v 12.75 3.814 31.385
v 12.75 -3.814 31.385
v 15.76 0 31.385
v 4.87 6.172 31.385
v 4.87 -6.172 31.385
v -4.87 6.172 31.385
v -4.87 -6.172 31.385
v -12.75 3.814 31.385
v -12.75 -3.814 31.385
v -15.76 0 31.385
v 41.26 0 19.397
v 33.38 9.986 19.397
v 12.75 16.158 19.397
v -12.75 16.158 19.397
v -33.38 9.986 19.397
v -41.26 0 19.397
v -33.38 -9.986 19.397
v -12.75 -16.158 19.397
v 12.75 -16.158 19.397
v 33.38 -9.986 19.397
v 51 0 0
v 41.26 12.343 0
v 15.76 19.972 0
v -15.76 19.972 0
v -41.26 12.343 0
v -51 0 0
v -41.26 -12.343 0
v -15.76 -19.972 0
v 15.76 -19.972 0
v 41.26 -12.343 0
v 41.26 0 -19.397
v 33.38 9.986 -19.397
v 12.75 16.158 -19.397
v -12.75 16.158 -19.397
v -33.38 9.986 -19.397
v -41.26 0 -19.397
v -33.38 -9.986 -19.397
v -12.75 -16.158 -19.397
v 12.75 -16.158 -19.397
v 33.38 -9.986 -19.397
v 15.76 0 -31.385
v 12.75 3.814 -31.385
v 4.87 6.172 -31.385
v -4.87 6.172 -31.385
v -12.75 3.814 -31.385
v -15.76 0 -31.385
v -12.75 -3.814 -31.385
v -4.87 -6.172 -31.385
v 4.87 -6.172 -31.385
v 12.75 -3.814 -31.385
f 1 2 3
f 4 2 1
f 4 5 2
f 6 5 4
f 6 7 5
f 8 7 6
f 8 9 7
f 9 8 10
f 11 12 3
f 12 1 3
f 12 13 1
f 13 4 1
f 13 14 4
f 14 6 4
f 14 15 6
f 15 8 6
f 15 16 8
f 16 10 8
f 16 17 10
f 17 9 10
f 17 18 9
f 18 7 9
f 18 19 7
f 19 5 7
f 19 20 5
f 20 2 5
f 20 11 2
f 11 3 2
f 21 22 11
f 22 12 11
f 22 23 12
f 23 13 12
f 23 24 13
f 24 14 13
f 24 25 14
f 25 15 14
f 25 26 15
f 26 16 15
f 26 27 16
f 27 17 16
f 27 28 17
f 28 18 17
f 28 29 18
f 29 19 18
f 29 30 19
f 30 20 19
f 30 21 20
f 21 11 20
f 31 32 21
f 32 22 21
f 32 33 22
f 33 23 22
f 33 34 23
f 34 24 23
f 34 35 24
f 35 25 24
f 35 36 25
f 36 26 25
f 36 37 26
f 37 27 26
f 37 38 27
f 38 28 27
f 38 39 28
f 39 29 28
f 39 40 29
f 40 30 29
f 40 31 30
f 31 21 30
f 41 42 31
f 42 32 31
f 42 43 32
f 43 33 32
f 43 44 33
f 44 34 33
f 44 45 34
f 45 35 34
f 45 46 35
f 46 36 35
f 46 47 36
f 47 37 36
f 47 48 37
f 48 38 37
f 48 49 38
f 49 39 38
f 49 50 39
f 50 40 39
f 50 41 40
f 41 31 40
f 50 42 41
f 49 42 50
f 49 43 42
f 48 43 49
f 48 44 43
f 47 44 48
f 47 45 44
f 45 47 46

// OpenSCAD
// Generated by SolidPython 1.0.1 on 2020-07-29 00:46:52


scale(v = [17, 7, 11]) {
	sphere(r = 3);
}
/***********************************************
*********      SolidPython code:      **********
************************************************
 
# import packages: SolidPython
from solid import *
from solid.utils import *
from itertools import chain, combinations, permutations


class Resize:

    def __init__(self, scad_file):
        self.scad_file = scad_file
        #self.scad_file = import_scad(scad_file)
        # cone/cylinder param:
        self.r1 = 0
        self.r2 = 0
        self.h = 0
        # rectangular prism param:
        self.w = 0
        self.l = 0
        # ellipse param:
        self.r = 0

    # import OpenScad code (file name corresponds to shape)


    # classify shape + parameters
    def assign(self, param1, param2, param3):
        if self.scad_file == 'cone.scad':
            self.r1 = param1
            self.r2 = param2
            self.h = param3
        elif self.scad_file == 'cylinder.scad':
            self.r1 = param1
            self.r2 = param2
            self.h = param3
        elif self.scad_file == 'rectangularPrism.scad':
            self.h = param1
            self.l = param2
            self.w = param3
        else:
            self.r = param1
            self.h = param2

    # resize parameters
    def iterate(self):
        x = range(3, 20, 2)
        i = 1
        if self.scad_file == 'cone.scad':
            tempList = list(permutations(x, 2))
            for temp in tempList:
                param1 = temp[0]
                param2 = temp[1]
                filepath = 'produced_scad_files/' + 'cone' + str(param1) + '_' + str(param2) + '_' + '.scad'
                scad_render_to_file(cylinder(h=param1, r1=param2, r2=0), filepath)

        elif self.scad_file == 'cylinder.scad':
            tempList = list(permutations(x, 3))
            for temp in tempList:
                param1 = temp[0]
                param2 = temp[1]
                filepath = 'produced_scad_files/' + 'cylinder' + str(param1) + '_' + str(param2) + '_' + '.scad'
                scad_render_to_file(cylinder(h=param1, r1=param2, r2=param2), filepath)

        elif self.scad_file == 'rectangularPrism.scad':
            tempList = list(permutations(x, 3))
            for temp in tempList:
                param1 = temp[0]
                param2 = temp[1]
                param3 = temp[2]
                filepath = 'produced_scad_files/' + 'rectangularPrism' + str(param1) + '_' + str(param2) + '_' + str(
                    param3) + '.scad'
                scad_render_to_file(cube(size=(param1, param2, param3)), filepath)

        elif self.scad_file == 'ellipse.scad':
            tempList = list(permutations(x, 4))
            for temp in tempList:
                param1 = temp[0]
                param2 = temp[1]
                param3 = temp[2]
                param4 = temp[3]
                filepath = 'produced_scad_files/' + 'ellipse' + str(param1) + '_' + str(param2) + '_' + str(param3) + '_' + str(param4) + '.scad'
                scad_render_to_file(scale([param1, param2, param3])(sphere(r=param4)), filepath)

    def render_to_scadfile(self):
        scad_render_to_file(scad, 'example.scad') 
 
************************************************/
